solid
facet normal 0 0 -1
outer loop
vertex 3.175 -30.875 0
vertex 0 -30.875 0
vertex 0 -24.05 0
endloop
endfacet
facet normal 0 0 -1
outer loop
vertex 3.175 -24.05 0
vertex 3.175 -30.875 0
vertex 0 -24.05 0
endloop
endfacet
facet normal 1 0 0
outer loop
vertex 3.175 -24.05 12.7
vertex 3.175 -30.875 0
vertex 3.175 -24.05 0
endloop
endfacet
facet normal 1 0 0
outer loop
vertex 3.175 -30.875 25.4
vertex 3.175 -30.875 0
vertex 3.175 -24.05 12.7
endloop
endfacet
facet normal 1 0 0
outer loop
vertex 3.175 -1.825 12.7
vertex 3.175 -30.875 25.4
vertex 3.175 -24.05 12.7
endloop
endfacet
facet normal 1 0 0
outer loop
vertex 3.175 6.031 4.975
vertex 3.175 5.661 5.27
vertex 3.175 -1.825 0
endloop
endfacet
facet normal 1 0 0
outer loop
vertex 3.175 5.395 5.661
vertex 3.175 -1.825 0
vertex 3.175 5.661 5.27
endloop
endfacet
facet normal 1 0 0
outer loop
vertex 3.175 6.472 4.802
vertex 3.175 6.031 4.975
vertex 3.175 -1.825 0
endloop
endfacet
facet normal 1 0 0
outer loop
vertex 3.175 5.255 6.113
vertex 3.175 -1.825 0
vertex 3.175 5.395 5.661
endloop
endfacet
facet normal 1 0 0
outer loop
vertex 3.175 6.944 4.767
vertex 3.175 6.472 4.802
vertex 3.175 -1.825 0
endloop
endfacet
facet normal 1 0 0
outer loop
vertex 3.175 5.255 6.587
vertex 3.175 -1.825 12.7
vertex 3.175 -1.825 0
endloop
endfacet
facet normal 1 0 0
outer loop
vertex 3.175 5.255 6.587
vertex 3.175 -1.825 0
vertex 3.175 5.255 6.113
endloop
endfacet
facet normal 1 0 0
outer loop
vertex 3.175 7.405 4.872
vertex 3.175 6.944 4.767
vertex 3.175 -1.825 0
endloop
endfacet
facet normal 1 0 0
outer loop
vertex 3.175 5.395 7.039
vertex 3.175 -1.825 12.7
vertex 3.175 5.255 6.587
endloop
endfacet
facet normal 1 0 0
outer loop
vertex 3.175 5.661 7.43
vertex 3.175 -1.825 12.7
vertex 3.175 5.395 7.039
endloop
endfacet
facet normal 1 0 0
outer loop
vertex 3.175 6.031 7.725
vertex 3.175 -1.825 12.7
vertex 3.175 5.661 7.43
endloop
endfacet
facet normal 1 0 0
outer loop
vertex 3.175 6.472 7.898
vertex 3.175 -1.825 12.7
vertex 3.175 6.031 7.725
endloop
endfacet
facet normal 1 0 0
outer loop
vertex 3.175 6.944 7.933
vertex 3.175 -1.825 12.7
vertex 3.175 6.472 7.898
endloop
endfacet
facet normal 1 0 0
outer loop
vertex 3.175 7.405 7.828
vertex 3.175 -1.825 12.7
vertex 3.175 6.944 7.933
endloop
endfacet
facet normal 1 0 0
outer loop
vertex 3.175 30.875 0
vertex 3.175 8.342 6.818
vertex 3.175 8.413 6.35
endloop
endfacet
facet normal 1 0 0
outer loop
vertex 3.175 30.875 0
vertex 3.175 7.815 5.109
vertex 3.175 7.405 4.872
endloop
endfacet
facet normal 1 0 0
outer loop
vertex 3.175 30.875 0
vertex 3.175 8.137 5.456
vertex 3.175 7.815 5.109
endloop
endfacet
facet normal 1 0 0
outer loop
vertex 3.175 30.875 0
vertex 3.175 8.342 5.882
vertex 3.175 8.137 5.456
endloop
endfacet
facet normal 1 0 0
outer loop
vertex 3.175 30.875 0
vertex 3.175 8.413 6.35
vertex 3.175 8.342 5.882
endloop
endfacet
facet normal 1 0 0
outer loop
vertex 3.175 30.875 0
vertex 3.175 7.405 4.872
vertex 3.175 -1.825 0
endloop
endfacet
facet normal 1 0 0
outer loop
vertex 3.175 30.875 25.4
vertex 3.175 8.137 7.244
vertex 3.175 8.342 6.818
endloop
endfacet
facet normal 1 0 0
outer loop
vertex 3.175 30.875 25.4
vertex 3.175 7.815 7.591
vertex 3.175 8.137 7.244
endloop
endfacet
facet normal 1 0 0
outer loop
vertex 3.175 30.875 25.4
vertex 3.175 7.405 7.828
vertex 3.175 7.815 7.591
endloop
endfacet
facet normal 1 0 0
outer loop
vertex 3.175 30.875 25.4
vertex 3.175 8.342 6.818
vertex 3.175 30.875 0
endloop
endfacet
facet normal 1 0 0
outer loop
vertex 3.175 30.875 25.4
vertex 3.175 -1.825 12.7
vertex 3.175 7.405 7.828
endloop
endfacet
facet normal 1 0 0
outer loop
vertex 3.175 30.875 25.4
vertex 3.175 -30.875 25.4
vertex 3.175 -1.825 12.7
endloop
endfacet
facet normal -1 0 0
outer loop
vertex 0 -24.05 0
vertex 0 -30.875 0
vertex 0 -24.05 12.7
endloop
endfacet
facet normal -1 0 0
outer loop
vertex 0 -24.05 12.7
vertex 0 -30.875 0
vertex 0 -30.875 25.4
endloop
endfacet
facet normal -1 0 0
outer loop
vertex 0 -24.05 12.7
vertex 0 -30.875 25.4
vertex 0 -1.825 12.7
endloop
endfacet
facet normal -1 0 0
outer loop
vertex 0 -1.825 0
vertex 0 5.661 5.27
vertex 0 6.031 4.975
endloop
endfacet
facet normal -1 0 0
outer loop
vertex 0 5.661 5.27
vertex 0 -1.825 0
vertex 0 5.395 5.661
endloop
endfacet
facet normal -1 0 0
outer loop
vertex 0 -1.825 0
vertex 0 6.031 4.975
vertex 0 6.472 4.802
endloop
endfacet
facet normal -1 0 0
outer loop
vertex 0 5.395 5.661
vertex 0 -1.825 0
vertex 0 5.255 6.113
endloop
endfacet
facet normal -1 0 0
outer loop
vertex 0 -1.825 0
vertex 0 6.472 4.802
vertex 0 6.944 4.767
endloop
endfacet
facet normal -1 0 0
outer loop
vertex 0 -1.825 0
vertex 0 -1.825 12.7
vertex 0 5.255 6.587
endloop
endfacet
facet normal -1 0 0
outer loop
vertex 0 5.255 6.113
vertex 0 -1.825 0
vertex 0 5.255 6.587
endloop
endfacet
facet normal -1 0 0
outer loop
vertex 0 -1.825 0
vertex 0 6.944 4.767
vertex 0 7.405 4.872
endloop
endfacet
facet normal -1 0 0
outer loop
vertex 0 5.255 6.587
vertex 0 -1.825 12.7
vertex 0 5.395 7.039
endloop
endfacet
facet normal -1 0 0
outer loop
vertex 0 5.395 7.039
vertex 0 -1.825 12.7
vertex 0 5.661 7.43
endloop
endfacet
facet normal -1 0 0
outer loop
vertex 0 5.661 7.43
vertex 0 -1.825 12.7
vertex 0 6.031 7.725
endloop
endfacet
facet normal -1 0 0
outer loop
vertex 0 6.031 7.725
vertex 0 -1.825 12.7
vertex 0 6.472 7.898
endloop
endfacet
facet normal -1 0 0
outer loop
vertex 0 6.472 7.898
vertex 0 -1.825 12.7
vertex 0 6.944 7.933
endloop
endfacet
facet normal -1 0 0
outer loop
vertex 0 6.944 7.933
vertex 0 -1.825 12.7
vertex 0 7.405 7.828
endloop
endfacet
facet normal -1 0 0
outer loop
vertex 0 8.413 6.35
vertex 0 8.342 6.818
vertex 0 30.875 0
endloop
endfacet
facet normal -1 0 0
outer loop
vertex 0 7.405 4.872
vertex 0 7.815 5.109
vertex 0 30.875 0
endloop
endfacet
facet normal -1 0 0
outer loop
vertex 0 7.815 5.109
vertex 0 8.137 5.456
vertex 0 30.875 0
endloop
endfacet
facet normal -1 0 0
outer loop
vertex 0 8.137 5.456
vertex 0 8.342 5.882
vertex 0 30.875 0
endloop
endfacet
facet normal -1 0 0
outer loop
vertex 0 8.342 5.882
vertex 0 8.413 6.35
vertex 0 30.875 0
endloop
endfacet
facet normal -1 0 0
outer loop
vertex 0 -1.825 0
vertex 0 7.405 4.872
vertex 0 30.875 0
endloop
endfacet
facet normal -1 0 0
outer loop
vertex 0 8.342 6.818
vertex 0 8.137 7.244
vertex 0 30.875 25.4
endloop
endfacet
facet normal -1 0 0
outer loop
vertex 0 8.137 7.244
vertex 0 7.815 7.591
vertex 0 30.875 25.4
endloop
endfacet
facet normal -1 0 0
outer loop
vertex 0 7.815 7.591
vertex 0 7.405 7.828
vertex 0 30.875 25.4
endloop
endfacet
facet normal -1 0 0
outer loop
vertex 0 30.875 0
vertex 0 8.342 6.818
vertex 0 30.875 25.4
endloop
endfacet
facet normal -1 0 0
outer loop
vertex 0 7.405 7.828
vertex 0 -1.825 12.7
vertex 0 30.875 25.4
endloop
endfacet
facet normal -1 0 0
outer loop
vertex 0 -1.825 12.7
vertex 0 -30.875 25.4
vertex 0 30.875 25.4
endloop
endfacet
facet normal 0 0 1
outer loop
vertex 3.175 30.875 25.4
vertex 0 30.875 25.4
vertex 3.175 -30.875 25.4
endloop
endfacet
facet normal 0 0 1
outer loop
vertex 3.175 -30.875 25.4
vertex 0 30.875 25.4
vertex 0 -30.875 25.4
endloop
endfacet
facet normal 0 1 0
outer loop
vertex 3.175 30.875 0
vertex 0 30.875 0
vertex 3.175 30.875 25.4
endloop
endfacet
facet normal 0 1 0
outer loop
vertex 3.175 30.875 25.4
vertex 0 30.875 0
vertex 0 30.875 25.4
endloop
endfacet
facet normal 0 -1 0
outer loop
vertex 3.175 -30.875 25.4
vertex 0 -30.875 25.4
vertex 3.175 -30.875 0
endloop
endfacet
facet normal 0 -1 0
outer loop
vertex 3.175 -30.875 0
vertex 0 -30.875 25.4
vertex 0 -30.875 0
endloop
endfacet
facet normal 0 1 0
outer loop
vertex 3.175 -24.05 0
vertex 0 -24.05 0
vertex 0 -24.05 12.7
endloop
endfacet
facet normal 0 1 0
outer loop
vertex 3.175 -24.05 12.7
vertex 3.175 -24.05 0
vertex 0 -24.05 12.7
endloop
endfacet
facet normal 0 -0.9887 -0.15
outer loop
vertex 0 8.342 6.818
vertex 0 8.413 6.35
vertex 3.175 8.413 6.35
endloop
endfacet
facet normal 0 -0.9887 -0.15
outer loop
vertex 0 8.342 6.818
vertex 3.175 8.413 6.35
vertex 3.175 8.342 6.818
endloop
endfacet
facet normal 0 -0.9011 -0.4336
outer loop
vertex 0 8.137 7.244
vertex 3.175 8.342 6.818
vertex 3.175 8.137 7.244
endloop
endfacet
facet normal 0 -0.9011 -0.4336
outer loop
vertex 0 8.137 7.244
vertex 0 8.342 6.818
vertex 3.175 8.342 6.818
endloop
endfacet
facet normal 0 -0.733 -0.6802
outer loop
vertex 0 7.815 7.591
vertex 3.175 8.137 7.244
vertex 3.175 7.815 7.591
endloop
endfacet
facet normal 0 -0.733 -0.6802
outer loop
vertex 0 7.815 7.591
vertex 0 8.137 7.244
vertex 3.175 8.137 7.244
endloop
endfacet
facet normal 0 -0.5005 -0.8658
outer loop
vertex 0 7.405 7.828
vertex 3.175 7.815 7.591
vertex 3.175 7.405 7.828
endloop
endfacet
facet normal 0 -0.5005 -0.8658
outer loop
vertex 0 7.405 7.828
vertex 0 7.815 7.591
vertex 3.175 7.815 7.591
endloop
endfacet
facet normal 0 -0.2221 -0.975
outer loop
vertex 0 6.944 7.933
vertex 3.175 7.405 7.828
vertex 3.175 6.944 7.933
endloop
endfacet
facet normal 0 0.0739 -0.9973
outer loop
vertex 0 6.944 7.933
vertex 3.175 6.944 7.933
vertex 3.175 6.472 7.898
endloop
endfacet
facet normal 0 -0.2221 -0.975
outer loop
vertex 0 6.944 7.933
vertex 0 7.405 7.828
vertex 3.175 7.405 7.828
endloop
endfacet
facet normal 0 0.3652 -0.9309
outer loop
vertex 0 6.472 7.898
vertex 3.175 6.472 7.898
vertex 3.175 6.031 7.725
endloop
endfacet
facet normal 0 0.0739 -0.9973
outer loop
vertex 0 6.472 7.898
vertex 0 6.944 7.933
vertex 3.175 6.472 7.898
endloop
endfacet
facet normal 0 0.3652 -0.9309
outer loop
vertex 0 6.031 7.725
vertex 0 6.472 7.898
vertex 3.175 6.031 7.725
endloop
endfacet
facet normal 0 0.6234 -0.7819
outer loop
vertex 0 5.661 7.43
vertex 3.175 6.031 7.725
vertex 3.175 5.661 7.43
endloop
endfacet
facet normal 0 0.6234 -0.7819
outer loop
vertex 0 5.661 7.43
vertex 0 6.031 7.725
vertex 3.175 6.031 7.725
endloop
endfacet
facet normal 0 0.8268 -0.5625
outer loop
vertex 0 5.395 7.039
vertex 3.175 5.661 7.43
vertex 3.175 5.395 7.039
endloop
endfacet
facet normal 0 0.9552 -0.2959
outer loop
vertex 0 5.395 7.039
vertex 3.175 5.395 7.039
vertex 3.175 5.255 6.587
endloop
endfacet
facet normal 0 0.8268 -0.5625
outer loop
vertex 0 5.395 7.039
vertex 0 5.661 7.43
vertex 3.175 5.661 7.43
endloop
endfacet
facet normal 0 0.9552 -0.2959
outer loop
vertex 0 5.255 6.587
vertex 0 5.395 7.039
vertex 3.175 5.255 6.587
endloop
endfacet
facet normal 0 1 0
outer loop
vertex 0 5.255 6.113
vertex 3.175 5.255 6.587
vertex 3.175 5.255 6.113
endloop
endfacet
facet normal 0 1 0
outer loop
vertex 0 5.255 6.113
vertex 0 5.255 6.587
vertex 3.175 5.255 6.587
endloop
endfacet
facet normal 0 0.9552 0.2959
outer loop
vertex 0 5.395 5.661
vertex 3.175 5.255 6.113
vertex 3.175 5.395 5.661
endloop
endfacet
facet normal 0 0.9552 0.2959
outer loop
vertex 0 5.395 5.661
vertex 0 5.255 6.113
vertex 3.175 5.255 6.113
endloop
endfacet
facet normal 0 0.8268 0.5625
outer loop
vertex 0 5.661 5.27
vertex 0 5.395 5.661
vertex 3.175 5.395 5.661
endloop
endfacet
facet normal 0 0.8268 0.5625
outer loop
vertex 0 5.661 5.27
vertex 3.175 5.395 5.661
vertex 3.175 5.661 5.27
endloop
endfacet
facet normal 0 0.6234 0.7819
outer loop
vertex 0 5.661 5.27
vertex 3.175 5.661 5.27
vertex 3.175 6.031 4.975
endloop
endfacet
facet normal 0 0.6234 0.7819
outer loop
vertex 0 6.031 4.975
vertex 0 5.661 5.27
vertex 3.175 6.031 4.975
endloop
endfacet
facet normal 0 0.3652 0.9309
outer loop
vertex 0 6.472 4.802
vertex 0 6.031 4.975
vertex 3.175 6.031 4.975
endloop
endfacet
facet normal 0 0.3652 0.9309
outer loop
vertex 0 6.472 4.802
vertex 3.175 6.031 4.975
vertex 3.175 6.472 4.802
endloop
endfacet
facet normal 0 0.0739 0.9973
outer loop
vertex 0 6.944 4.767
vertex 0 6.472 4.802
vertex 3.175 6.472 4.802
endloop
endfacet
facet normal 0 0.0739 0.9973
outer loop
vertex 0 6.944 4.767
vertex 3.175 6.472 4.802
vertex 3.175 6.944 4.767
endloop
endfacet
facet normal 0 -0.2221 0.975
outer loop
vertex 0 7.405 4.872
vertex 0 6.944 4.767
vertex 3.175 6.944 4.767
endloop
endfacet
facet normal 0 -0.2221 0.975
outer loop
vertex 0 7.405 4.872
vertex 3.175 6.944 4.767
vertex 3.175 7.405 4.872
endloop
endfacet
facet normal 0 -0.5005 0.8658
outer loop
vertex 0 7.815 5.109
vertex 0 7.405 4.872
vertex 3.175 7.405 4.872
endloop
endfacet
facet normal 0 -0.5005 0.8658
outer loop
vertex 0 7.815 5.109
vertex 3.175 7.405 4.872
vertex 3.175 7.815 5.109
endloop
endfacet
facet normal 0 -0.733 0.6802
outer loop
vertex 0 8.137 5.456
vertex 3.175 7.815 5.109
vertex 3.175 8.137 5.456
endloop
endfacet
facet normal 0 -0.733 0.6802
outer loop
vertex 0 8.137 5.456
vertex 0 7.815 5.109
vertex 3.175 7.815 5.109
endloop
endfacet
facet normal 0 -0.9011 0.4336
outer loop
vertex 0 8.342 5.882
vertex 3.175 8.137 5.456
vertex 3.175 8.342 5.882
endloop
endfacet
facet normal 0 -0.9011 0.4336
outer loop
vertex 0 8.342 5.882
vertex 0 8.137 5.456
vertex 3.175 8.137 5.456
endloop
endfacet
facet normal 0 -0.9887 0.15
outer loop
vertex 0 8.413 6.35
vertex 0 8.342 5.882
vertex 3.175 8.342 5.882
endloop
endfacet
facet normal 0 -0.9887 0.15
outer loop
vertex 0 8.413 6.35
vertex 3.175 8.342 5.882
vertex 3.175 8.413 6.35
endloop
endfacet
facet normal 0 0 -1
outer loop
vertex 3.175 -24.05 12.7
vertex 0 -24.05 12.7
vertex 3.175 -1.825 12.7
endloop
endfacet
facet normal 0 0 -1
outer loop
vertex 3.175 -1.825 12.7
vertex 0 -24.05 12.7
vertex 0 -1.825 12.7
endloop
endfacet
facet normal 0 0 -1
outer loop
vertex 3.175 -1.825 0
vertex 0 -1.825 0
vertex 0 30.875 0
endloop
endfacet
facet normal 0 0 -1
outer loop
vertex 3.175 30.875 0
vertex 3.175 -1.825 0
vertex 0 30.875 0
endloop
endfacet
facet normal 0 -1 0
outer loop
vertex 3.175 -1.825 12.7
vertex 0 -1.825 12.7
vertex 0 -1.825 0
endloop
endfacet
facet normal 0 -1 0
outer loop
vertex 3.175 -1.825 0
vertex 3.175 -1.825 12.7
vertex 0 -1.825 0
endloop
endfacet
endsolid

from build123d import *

# Parameters (mm, degrees)
F0_R     = 1.5875
F1_DEPTH = 3.175


with BuildPart() as f1:
    # F0 (on Right) → F1 (new body)
    with BuildSketch(Plane.YZ):
        Polygon((-30.874995, 25.4), (-30.874995, 0), (-24.04999, 0), (-24.04999, 12.7), (-1.82499, 12.7), (-1.82499, 0), (30.874995, 0), (30.874995, 6.35), (30.874995, 25.4), align=None)
        with Locations((6.825005, 6.35)):
            Circle(F0_R, mode=Mode.SUBTRACT)
    extrude(amount=F1_DEPTH)


solid = f1.part
